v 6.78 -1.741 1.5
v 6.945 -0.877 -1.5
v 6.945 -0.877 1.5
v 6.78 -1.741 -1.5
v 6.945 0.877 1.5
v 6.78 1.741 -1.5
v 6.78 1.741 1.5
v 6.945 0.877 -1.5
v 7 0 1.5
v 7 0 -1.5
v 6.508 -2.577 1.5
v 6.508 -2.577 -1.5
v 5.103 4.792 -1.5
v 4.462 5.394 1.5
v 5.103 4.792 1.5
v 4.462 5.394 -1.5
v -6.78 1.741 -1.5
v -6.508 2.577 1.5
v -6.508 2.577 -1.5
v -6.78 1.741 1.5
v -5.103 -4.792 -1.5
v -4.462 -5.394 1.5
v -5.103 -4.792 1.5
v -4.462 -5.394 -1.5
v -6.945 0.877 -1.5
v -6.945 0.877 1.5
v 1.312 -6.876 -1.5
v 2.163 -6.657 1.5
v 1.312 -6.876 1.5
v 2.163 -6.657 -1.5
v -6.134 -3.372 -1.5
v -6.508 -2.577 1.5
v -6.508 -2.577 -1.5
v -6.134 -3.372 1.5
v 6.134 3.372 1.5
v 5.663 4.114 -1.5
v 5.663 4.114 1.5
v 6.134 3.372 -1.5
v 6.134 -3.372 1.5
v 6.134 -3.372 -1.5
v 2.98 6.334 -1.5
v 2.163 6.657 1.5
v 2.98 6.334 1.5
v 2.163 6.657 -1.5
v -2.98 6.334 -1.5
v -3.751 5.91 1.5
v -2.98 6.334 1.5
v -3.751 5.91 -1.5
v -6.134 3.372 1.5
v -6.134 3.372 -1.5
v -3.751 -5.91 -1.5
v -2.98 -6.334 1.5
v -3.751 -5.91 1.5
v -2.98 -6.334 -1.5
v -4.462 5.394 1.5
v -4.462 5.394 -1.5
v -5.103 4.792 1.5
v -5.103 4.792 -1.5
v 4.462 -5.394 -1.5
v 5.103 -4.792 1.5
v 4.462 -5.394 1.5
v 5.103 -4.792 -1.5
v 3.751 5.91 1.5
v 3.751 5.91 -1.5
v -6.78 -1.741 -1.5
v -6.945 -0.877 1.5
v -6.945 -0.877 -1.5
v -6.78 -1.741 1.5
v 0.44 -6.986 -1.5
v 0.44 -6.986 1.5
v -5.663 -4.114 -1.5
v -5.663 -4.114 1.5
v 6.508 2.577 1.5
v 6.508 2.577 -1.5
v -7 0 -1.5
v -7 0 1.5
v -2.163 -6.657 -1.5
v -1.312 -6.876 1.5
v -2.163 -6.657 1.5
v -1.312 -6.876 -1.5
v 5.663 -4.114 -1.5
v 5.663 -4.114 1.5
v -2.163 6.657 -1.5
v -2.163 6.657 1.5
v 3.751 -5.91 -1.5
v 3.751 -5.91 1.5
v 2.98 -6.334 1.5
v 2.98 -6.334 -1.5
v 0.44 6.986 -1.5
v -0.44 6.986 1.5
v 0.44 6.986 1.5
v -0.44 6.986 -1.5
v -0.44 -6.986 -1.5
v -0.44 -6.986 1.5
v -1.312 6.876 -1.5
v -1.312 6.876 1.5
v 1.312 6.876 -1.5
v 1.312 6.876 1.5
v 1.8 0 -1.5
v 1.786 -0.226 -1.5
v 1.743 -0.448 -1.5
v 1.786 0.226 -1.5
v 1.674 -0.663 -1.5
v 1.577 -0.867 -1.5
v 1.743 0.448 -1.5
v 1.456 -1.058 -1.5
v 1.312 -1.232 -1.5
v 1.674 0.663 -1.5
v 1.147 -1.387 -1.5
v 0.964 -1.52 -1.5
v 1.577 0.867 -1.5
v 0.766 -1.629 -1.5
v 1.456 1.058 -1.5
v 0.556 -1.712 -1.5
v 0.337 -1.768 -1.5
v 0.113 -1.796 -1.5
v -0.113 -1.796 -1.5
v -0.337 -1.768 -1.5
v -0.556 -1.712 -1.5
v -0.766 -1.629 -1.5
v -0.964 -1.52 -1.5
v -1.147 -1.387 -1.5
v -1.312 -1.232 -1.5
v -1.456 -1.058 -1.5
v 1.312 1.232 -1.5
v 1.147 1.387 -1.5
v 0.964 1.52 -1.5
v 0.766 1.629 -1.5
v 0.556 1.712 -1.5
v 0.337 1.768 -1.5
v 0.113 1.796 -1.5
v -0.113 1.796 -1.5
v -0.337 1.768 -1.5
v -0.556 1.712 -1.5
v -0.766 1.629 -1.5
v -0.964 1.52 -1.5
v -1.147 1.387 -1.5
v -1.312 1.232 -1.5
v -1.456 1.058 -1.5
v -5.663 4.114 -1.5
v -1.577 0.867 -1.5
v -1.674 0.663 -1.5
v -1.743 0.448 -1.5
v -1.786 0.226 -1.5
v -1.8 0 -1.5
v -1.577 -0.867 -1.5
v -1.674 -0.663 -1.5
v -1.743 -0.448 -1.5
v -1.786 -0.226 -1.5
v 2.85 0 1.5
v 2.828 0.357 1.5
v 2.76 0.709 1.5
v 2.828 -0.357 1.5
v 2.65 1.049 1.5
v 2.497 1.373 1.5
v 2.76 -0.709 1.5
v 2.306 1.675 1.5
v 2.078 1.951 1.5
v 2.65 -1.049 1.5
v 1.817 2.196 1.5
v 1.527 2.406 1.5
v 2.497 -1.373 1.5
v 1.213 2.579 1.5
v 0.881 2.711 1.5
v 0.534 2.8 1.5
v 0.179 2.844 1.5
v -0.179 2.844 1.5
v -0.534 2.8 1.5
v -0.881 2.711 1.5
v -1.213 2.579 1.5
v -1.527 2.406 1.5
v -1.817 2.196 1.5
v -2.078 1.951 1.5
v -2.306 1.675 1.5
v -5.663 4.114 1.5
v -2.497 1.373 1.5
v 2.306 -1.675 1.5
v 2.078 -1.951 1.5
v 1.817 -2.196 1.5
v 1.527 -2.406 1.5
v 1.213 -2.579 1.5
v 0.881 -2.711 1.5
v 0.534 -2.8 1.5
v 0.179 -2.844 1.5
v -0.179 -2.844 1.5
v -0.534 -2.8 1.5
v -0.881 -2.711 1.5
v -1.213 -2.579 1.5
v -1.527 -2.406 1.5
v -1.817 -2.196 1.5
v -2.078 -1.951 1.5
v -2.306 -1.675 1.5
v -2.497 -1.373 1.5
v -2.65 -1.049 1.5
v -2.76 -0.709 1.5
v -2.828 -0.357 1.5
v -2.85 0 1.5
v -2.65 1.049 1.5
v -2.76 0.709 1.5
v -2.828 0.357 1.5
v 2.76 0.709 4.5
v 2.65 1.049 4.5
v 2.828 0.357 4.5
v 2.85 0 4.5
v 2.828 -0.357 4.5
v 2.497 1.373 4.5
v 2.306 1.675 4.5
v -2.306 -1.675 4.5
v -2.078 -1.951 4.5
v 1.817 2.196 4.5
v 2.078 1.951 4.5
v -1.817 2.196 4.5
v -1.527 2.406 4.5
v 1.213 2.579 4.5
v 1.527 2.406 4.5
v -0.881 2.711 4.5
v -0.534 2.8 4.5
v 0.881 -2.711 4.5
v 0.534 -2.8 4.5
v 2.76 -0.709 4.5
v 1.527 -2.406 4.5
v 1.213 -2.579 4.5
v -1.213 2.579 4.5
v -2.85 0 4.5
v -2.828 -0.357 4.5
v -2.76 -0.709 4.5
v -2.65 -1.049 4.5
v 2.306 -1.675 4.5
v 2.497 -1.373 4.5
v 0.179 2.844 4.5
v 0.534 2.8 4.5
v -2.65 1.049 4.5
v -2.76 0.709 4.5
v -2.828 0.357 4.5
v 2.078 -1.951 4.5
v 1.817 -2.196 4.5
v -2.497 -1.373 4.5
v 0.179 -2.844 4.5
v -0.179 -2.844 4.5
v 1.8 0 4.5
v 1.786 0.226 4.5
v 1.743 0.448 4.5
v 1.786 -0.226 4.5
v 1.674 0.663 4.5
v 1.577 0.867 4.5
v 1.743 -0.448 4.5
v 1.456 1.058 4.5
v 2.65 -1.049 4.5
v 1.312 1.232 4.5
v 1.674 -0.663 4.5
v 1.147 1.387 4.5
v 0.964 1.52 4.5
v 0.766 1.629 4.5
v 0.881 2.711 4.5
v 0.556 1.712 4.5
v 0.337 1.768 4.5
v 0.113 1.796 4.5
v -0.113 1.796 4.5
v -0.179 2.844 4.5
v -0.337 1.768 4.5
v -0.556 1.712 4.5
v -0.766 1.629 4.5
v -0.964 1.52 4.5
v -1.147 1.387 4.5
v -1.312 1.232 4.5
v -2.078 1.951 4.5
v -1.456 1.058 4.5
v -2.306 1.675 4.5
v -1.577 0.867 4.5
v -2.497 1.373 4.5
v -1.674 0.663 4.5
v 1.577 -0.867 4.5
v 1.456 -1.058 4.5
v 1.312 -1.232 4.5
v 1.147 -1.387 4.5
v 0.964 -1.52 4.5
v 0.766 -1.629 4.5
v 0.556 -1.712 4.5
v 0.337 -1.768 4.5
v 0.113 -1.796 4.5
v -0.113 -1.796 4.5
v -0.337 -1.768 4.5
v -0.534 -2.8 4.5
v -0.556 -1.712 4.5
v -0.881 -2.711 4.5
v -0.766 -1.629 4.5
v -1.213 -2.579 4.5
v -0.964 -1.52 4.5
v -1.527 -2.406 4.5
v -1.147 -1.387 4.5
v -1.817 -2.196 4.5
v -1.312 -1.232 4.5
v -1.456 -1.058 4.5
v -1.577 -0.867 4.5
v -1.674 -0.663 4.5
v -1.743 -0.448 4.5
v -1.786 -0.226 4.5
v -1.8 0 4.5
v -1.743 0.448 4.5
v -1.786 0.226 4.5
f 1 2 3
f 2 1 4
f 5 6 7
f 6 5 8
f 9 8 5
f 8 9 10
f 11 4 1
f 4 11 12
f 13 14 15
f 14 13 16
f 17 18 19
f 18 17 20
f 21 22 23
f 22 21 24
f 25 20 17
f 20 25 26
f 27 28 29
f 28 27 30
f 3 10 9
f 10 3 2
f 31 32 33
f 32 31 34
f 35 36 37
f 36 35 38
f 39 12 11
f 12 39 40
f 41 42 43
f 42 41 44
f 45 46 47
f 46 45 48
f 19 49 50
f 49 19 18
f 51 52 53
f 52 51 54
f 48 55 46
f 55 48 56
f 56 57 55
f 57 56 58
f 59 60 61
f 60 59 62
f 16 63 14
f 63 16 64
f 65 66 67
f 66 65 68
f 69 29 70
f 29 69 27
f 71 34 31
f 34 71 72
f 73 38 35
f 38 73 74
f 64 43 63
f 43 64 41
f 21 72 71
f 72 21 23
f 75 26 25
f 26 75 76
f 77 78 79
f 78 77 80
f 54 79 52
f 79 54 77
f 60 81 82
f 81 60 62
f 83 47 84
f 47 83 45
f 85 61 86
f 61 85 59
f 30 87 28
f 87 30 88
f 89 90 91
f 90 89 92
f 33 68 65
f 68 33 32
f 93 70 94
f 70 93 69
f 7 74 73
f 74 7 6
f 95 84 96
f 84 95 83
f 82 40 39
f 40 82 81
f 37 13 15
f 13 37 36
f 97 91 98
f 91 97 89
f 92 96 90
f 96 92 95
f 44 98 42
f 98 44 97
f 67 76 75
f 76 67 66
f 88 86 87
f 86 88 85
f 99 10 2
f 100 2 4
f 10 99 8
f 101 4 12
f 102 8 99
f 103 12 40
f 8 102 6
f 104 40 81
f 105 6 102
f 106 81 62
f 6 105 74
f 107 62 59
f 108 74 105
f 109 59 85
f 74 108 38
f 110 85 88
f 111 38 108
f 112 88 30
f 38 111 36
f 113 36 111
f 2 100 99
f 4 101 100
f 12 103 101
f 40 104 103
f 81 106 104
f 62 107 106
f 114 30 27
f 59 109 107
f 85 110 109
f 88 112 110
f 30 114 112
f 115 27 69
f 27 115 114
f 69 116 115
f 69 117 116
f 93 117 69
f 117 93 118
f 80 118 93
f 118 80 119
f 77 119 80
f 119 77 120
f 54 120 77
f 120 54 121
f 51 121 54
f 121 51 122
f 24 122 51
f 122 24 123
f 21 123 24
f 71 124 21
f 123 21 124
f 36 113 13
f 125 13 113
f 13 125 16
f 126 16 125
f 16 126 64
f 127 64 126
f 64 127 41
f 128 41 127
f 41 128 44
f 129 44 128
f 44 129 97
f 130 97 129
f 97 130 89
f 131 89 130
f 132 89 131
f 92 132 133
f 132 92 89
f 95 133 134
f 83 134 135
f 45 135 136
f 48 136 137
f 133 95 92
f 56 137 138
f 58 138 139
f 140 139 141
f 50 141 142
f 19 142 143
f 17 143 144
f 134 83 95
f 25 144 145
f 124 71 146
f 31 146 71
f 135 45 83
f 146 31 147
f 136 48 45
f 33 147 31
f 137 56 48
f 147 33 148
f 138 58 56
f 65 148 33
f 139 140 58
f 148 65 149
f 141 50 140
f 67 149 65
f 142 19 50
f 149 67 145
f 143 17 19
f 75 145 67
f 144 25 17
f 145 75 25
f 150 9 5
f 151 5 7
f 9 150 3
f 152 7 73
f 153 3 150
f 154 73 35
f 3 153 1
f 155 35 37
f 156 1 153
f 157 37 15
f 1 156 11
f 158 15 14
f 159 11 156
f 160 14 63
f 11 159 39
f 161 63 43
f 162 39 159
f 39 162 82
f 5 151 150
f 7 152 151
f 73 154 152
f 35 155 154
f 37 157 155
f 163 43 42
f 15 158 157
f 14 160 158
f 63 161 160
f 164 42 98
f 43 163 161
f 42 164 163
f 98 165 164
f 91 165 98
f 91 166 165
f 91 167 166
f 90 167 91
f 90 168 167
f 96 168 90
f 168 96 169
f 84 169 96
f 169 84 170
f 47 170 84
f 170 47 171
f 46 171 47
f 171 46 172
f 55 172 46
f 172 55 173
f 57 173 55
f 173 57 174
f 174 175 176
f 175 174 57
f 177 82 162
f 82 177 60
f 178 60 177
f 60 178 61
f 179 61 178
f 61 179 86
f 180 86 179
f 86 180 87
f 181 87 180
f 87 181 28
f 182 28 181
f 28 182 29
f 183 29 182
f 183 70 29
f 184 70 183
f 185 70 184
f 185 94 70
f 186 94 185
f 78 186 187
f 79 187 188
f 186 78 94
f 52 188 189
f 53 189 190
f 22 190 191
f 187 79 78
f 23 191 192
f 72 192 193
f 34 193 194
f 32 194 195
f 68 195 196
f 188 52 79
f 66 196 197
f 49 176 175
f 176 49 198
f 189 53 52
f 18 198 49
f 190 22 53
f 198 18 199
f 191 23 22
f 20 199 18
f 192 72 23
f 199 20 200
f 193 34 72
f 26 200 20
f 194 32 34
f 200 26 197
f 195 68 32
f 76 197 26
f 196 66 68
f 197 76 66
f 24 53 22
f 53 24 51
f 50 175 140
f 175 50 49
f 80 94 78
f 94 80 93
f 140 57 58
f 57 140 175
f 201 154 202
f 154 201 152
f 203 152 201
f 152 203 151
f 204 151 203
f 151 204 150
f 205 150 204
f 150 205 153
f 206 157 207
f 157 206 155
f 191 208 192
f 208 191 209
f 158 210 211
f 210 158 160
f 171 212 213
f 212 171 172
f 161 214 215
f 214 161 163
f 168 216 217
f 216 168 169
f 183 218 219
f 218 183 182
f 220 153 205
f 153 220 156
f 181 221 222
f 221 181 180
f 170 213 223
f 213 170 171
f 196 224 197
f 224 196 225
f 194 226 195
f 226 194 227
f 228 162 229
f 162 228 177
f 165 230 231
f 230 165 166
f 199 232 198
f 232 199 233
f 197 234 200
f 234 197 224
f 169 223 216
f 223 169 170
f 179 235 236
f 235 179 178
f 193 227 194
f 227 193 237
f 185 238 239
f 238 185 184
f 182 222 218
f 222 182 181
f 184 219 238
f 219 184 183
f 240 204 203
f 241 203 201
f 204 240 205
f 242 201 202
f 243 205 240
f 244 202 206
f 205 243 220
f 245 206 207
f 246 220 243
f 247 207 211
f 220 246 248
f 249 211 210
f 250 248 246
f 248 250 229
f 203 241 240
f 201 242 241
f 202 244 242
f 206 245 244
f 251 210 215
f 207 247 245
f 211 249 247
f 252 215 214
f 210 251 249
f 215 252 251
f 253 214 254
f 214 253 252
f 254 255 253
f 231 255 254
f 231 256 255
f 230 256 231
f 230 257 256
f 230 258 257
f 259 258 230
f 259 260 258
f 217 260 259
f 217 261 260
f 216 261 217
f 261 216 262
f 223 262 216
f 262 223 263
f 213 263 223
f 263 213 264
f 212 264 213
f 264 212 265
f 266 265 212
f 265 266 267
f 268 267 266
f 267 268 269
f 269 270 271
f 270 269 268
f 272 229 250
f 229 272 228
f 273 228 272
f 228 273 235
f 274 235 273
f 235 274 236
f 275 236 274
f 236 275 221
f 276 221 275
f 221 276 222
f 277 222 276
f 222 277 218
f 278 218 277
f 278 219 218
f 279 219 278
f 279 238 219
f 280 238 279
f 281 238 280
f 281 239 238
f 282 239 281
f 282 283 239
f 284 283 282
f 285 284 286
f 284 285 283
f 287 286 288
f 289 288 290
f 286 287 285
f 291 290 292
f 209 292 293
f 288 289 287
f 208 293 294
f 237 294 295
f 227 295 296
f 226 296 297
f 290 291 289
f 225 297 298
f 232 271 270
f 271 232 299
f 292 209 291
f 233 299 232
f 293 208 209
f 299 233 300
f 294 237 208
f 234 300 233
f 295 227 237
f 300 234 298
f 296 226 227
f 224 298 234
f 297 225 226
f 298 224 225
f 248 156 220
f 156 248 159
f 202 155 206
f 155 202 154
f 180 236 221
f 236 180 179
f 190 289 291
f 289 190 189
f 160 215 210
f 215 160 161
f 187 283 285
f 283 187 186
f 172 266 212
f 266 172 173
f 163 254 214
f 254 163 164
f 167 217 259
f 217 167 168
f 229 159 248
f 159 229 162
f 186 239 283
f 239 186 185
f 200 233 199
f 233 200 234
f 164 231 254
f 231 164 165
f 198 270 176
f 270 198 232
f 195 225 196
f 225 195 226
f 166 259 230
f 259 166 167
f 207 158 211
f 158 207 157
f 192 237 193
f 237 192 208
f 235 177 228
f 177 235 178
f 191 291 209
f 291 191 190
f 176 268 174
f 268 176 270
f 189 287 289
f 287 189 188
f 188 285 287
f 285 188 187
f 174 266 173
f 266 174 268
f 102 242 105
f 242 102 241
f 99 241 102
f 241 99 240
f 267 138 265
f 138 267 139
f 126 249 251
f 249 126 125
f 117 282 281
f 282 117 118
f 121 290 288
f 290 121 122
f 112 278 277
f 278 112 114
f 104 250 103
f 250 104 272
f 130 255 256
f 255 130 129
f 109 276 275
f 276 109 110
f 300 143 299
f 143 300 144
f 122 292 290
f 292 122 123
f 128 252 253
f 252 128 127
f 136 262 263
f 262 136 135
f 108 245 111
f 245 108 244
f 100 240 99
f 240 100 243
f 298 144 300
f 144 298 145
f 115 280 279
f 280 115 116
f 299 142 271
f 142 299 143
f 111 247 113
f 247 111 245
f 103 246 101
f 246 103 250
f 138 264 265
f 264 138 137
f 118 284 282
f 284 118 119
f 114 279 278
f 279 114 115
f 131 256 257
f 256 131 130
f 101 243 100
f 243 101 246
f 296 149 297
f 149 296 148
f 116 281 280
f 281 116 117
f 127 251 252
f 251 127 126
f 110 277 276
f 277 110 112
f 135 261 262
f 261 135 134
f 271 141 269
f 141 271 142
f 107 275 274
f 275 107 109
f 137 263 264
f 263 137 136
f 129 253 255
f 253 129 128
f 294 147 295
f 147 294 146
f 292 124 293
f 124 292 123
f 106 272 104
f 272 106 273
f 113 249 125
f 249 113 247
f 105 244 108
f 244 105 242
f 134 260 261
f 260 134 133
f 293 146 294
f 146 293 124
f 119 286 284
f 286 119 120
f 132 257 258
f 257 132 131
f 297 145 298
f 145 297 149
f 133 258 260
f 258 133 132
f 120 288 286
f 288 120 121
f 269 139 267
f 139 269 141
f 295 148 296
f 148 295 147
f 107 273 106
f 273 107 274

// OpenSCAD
$fn = 50;


difference() {
	union() {
		translate(v = [0, 0, -1.5000000000]) {
			rotate(a = [0, 0, 0]) {
				cylinder(h = 3, r = 7.0000000000);
			}
		}
		translate(v = [0, 0, -1.5000000000]) {
			rotate(a = [0, 0, 0]) {
				cylinder(h = 6, r = 2.8500000000);
			}
		}
	}
	union() {
		translate(v = [0, 0, -125.0000000000]) {
			rotate(a = [0, 0, 0]) {
				cylinder(h = 250, r = 1.8000000000);
			}
		}
	}
}
